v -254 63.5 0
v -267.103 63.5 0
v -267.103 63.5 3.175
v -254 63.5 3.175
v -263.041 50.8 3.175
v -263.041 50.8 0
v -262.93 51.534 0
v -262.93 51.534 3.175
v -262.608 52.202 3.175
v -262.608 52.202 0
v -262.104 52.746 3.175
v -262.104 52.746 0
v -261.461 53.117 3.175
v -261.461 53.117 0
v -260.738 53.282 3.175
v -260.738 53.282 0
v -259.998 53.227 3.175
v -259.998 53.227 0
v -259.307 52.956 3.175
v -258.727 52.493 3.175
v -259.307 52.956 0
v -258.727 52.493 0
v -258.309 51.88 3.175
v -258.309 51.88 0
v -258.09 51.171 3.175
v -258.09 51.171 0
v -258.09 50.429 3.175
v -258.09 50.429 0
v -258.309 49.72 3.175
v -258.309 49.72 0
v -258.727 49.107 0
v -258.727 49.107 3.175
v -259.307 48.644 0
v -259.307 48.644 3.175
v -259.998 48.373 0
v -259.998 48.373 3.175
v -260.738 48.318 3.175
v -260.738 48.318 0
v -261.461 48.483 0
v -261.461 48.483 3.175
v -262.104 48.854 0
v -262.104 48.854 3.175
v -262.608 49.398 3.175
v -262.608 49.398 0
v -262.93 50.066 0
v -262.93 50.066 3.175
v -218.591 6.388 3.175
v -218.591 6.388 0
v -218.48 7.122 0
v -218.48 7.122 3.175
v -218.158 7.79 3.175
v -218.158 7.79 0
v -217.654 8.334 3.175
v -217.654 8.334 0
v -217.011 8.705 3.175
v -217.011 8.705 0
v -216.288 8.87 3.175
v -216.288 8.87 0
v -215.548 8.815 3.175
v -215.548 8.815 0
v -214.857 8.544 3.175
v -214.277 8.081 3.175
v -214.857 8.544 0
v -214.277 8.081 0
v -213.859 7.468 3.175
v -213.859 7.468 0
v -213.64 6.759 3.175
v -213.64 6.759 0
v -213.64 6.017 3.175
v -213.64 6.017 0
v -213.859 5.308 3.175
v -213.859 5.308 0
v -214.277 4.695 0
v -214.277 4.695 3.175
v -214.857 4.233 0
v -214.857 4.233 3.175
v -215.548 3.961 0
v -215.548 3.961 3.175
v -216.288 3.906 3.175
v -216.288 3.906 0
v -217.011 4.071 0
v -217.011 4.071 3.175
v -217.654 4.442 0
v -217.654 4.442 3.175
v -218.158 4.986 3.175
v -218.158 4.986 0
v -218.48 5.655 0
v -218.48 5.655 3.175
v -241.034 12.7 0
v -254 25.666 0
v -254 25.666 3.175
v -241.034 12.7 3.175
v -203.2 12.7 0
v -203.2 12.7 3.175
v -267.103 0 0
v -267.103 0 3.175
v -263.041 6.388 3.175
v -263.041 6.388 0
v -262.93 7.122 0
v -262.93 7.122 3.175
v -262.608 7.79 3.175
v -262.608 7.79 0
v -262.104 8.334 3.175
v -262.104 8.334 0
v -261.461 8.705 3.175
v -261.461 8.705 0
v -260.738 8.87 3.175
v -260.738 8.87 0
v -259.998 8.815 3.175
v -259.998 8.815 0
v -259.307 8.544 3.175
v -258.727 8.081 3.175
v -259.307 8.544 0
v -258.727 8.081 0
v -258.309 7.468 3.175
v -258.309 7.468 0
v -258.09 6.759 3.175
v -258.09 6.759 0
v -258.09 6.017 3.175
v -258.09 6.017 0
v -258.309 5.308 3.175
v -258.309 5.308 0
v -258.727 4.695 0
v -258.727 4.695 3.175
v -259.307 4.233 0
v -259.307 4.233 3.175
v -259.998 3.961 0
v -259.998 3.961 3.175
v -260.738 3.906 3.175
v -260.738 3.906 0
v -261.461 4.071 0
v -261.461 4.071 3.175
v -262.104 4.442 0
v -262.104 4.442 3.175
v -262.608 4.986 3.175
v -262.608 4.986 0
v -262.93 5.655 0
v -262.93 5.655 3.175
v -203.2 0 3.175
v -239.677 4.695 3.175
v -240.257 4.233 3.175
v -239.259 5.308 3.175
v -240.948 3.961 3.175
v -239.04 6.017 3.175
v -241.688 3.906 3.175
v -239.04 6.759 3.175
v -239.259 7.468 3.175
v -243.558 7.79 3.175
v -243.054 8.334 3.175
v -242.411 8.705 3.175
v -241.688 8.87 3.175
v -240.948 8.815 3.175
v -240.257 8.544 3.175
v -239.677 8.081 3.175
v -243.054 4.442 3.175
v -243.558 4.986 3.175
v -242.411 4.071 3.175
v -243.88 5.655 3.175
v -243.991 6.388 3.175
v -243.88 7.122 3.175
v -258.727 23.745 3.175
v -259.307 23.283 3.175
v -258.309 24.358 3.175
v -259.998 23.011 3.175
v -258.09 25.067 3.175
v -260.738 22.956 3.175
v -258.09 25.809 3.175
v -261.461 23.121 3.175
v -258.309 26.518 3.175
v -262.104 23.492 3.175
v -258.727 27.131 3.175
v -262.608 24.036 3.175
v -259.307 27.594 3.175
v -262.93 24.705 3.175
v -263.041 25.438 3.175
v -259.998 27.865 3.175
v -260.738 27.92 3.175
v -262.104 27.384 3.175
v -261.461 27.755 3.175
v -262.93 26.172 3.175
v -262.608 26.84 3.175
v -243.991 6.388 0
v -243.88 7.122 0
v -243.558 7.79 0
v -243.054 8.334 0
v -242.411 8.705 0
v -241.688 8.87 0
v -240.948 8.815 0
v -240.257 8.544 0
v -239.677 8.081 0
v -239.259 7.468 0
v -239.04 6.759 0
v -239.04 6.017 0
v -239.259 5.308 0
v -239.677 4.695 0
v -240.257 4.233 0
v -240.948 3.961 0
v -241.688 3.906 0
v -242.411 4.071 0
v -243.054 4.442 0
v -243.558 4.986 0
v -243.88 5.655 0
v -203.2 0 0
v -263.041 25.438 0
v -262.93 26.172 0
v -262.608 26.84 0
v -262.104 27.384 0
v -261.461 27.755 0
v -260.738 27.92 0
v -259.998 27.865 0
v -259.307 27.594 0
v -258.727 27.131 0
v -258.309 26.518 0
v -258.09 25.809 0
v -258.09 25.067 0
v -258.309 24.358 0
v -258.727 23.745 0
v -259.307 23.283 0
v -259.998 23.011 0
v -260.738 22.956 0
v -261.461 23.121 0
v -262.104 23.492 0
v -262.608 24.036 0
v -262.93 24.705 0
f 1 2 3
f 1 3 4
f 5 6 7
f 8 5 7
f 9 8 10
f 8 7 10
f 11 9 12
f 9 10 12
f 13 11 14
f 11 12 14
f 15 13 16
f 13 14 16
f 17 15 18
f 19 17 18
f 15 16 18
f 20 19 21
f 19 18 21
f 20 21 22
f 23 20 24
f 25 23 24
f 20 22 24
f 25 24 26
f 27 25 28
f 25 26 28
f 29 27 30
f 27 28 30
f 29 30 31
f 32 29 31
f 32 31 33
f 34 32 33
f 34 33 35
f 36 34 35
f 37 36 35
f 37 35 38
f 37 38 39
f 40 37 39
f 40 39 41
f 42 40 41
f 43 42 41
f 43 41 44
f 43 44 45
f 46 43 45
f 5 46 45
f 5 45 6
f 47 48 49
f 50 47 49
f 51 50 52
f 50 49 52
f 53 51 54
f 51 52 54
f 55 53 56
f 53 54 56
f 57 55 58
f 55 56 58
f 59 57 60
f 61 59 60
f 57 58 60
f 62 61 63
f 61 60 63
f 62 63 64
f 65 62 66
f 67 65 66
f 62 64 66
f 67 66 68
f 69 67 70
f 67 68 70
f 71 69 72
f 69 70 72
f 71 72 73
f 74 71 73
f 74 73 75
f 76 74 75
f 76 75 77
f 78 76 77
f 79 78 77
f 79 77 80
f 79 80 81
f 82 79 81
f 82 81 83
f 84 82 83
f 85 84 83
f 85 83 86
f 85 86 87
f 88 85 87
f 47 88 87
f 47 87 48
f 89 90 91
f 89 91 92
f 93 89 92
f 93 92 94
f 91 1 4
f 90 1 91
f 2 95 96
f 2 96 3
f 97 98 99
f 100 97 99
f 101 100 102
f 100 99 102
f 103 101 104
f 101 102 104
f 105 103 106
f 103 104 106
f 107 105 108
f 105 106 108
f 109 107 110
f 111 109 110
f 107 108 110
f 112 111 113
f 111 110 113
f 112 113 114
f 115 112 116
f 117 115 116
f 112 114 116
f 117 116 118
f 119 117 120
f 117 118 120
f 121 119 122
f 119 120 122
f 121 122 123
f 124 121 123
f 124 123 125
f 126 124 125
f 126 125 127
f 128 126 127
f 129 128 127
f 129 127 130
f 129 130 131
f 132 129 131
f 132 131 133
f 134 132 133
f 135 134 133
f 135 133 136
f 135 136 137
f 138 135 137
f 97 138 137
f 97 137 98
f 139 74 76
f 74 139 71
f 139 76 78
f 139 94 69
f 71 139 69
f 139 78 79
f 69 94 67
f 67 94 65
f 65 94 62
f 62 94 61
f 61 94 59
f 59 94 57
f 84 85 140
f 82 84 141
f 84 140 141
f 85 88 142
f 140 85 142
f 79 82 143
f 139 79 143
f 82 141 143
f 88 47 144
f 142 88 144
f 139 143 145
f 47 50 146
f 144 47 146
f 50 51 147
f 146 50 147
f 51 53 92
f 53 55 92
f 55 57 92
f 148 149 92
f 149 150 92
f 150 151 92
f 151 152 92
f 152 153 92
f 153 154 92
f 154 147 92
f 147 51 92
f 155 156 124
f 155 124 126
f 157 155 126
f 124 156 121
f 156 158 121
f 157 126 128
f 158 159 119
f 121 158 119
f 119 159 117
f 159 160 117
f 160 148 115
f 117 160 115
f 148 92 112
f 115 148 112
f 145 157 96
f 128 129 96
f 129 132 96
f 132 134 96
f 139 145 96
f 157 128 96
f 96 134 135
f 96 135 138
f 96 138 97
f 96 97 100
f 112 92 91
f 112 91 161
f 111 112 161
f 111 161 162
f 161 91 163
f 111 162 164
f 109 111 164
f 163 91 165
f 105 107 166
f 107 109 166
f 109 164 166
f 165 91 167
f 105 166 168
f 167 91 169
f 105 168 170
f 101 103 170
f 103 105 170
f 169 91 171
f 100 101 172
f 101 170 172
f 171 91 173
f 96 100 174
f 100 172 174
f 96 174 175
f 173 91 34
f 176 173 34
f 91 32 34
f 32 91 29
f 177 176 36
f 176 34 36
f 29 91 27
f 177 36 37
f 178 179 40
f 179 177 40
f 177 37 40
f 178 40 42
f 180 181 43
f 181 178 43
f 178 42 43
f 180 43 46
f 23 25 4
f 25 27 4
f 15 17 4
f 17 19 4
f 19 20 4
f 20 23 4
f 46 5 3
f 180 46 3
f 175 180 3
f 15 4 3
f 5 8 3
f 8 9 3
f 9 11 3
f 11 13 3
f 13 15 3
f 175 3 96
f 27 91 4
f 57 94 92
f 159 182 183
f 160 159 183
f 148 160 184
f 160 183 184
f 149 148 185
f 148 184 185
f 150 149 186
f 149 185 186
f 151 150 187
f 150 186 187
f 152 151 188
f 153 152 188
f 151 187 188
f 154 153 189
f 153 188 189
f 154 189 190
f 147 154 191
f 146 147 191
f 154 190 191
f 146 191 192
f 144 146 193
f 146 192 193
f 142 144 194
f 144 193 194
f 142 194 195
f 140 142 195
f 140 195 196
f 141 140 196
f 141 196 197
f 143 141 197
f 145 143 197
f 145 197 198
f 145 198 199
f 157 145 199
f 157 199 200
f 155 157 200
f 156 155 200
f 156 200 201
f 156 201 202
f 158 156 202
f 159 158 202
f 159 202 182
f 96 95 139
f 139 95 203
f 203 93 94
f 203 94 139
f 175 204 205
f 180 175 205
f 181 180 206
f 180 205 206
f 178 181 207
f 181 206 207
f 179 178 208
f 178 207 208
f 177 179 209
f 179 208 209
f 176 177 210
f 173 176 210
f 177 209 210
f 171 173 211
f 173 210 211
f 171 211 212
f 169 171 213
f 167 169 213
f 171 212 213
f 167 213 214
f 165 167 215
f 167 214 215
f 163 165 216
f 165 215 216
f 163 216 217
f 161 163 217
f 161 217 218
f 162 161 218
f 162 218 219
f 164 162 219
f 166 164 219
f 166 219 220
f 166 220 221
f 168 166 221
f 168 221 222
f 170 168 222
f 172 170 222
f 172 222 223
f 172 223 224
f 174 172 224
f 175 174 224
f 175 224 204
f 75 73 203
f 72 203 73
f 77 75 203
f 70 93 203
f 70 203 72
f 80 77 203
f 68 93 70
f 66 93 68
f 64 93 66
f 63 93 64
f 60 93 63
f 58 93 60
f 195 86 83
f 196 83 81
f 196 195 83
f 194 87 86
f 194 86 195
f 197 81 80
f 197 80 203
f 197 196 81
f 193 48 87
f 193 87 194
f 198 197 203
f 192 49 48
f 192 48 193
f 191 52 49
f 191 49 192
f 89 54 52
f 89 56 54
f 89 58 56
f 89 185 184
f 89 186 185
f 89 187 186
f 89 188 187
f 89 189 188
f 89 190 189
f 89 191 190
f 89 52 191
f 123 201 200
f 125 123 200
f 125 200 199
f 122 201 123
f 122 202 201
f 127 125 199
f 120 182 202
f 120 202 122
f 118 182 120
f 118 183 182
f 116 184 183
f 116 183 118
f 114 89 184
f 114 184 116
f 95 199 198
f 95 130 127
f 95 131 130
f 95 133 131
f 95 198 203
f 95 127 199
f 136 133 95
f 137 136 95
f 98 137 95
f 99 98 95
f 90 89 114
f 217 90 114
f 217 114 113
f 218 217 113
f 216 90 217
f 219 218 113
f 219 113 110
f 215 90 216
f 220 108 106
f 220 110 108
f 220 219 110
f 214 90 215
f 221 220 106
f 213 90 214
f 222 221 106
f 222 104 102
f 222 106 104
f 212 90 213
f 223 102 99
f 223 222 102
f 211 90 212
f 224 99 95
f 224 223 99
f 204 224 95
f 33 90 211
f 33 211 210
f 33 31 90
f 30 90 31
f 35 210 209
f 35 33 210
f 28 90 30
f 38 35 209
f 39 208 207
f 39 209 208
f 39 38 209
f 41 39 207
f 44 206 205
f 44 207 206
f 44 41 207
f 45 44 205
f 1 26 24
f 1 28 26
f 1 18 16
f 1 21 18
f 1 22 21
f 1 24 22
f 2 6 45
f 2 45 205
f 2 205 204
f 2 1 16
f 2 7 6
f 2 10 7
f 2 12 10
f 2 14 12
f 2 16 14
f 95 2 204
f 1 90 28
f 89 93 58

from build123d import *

# Parameters (mm, degrees)
BOSS_EXTRUDE1_DEPTH    = 3.175
F_10_CLEARANCE_HOLE1_D = 4.9784


with BuildPart() as part:
    # Sketch1 → Boss-Extrude1 (new body)
    with BuildSketch(Plane.XY):
        Polygon((-254.000000508, 0), (-267.103367516, 0), (-267.103367516, 63.5), (-254.000000508, 63.5), (-254.000000508, 25.666043074), (-241.033957434, 12.7), (-203.200000508, 12.7), (-203.200000508, 0), align=None)
    extrude(amount=BOSS_EXTRUDE1_DEPTH)

    # #10 Clearance Hole1 (through all)
    with Locations(Plane.XY.offset(3.175)):
        with Locations((-260.551684012, 6.388229415), (-260.551684012, 25.438229415), (-260.551684012, 50.8), (-241.501684012, 6.388229415), (-216.101684012, 6.388229415)):
            Hole(F_10_CLEARANCE_HOLE1_D / 2)


solid = part.part
